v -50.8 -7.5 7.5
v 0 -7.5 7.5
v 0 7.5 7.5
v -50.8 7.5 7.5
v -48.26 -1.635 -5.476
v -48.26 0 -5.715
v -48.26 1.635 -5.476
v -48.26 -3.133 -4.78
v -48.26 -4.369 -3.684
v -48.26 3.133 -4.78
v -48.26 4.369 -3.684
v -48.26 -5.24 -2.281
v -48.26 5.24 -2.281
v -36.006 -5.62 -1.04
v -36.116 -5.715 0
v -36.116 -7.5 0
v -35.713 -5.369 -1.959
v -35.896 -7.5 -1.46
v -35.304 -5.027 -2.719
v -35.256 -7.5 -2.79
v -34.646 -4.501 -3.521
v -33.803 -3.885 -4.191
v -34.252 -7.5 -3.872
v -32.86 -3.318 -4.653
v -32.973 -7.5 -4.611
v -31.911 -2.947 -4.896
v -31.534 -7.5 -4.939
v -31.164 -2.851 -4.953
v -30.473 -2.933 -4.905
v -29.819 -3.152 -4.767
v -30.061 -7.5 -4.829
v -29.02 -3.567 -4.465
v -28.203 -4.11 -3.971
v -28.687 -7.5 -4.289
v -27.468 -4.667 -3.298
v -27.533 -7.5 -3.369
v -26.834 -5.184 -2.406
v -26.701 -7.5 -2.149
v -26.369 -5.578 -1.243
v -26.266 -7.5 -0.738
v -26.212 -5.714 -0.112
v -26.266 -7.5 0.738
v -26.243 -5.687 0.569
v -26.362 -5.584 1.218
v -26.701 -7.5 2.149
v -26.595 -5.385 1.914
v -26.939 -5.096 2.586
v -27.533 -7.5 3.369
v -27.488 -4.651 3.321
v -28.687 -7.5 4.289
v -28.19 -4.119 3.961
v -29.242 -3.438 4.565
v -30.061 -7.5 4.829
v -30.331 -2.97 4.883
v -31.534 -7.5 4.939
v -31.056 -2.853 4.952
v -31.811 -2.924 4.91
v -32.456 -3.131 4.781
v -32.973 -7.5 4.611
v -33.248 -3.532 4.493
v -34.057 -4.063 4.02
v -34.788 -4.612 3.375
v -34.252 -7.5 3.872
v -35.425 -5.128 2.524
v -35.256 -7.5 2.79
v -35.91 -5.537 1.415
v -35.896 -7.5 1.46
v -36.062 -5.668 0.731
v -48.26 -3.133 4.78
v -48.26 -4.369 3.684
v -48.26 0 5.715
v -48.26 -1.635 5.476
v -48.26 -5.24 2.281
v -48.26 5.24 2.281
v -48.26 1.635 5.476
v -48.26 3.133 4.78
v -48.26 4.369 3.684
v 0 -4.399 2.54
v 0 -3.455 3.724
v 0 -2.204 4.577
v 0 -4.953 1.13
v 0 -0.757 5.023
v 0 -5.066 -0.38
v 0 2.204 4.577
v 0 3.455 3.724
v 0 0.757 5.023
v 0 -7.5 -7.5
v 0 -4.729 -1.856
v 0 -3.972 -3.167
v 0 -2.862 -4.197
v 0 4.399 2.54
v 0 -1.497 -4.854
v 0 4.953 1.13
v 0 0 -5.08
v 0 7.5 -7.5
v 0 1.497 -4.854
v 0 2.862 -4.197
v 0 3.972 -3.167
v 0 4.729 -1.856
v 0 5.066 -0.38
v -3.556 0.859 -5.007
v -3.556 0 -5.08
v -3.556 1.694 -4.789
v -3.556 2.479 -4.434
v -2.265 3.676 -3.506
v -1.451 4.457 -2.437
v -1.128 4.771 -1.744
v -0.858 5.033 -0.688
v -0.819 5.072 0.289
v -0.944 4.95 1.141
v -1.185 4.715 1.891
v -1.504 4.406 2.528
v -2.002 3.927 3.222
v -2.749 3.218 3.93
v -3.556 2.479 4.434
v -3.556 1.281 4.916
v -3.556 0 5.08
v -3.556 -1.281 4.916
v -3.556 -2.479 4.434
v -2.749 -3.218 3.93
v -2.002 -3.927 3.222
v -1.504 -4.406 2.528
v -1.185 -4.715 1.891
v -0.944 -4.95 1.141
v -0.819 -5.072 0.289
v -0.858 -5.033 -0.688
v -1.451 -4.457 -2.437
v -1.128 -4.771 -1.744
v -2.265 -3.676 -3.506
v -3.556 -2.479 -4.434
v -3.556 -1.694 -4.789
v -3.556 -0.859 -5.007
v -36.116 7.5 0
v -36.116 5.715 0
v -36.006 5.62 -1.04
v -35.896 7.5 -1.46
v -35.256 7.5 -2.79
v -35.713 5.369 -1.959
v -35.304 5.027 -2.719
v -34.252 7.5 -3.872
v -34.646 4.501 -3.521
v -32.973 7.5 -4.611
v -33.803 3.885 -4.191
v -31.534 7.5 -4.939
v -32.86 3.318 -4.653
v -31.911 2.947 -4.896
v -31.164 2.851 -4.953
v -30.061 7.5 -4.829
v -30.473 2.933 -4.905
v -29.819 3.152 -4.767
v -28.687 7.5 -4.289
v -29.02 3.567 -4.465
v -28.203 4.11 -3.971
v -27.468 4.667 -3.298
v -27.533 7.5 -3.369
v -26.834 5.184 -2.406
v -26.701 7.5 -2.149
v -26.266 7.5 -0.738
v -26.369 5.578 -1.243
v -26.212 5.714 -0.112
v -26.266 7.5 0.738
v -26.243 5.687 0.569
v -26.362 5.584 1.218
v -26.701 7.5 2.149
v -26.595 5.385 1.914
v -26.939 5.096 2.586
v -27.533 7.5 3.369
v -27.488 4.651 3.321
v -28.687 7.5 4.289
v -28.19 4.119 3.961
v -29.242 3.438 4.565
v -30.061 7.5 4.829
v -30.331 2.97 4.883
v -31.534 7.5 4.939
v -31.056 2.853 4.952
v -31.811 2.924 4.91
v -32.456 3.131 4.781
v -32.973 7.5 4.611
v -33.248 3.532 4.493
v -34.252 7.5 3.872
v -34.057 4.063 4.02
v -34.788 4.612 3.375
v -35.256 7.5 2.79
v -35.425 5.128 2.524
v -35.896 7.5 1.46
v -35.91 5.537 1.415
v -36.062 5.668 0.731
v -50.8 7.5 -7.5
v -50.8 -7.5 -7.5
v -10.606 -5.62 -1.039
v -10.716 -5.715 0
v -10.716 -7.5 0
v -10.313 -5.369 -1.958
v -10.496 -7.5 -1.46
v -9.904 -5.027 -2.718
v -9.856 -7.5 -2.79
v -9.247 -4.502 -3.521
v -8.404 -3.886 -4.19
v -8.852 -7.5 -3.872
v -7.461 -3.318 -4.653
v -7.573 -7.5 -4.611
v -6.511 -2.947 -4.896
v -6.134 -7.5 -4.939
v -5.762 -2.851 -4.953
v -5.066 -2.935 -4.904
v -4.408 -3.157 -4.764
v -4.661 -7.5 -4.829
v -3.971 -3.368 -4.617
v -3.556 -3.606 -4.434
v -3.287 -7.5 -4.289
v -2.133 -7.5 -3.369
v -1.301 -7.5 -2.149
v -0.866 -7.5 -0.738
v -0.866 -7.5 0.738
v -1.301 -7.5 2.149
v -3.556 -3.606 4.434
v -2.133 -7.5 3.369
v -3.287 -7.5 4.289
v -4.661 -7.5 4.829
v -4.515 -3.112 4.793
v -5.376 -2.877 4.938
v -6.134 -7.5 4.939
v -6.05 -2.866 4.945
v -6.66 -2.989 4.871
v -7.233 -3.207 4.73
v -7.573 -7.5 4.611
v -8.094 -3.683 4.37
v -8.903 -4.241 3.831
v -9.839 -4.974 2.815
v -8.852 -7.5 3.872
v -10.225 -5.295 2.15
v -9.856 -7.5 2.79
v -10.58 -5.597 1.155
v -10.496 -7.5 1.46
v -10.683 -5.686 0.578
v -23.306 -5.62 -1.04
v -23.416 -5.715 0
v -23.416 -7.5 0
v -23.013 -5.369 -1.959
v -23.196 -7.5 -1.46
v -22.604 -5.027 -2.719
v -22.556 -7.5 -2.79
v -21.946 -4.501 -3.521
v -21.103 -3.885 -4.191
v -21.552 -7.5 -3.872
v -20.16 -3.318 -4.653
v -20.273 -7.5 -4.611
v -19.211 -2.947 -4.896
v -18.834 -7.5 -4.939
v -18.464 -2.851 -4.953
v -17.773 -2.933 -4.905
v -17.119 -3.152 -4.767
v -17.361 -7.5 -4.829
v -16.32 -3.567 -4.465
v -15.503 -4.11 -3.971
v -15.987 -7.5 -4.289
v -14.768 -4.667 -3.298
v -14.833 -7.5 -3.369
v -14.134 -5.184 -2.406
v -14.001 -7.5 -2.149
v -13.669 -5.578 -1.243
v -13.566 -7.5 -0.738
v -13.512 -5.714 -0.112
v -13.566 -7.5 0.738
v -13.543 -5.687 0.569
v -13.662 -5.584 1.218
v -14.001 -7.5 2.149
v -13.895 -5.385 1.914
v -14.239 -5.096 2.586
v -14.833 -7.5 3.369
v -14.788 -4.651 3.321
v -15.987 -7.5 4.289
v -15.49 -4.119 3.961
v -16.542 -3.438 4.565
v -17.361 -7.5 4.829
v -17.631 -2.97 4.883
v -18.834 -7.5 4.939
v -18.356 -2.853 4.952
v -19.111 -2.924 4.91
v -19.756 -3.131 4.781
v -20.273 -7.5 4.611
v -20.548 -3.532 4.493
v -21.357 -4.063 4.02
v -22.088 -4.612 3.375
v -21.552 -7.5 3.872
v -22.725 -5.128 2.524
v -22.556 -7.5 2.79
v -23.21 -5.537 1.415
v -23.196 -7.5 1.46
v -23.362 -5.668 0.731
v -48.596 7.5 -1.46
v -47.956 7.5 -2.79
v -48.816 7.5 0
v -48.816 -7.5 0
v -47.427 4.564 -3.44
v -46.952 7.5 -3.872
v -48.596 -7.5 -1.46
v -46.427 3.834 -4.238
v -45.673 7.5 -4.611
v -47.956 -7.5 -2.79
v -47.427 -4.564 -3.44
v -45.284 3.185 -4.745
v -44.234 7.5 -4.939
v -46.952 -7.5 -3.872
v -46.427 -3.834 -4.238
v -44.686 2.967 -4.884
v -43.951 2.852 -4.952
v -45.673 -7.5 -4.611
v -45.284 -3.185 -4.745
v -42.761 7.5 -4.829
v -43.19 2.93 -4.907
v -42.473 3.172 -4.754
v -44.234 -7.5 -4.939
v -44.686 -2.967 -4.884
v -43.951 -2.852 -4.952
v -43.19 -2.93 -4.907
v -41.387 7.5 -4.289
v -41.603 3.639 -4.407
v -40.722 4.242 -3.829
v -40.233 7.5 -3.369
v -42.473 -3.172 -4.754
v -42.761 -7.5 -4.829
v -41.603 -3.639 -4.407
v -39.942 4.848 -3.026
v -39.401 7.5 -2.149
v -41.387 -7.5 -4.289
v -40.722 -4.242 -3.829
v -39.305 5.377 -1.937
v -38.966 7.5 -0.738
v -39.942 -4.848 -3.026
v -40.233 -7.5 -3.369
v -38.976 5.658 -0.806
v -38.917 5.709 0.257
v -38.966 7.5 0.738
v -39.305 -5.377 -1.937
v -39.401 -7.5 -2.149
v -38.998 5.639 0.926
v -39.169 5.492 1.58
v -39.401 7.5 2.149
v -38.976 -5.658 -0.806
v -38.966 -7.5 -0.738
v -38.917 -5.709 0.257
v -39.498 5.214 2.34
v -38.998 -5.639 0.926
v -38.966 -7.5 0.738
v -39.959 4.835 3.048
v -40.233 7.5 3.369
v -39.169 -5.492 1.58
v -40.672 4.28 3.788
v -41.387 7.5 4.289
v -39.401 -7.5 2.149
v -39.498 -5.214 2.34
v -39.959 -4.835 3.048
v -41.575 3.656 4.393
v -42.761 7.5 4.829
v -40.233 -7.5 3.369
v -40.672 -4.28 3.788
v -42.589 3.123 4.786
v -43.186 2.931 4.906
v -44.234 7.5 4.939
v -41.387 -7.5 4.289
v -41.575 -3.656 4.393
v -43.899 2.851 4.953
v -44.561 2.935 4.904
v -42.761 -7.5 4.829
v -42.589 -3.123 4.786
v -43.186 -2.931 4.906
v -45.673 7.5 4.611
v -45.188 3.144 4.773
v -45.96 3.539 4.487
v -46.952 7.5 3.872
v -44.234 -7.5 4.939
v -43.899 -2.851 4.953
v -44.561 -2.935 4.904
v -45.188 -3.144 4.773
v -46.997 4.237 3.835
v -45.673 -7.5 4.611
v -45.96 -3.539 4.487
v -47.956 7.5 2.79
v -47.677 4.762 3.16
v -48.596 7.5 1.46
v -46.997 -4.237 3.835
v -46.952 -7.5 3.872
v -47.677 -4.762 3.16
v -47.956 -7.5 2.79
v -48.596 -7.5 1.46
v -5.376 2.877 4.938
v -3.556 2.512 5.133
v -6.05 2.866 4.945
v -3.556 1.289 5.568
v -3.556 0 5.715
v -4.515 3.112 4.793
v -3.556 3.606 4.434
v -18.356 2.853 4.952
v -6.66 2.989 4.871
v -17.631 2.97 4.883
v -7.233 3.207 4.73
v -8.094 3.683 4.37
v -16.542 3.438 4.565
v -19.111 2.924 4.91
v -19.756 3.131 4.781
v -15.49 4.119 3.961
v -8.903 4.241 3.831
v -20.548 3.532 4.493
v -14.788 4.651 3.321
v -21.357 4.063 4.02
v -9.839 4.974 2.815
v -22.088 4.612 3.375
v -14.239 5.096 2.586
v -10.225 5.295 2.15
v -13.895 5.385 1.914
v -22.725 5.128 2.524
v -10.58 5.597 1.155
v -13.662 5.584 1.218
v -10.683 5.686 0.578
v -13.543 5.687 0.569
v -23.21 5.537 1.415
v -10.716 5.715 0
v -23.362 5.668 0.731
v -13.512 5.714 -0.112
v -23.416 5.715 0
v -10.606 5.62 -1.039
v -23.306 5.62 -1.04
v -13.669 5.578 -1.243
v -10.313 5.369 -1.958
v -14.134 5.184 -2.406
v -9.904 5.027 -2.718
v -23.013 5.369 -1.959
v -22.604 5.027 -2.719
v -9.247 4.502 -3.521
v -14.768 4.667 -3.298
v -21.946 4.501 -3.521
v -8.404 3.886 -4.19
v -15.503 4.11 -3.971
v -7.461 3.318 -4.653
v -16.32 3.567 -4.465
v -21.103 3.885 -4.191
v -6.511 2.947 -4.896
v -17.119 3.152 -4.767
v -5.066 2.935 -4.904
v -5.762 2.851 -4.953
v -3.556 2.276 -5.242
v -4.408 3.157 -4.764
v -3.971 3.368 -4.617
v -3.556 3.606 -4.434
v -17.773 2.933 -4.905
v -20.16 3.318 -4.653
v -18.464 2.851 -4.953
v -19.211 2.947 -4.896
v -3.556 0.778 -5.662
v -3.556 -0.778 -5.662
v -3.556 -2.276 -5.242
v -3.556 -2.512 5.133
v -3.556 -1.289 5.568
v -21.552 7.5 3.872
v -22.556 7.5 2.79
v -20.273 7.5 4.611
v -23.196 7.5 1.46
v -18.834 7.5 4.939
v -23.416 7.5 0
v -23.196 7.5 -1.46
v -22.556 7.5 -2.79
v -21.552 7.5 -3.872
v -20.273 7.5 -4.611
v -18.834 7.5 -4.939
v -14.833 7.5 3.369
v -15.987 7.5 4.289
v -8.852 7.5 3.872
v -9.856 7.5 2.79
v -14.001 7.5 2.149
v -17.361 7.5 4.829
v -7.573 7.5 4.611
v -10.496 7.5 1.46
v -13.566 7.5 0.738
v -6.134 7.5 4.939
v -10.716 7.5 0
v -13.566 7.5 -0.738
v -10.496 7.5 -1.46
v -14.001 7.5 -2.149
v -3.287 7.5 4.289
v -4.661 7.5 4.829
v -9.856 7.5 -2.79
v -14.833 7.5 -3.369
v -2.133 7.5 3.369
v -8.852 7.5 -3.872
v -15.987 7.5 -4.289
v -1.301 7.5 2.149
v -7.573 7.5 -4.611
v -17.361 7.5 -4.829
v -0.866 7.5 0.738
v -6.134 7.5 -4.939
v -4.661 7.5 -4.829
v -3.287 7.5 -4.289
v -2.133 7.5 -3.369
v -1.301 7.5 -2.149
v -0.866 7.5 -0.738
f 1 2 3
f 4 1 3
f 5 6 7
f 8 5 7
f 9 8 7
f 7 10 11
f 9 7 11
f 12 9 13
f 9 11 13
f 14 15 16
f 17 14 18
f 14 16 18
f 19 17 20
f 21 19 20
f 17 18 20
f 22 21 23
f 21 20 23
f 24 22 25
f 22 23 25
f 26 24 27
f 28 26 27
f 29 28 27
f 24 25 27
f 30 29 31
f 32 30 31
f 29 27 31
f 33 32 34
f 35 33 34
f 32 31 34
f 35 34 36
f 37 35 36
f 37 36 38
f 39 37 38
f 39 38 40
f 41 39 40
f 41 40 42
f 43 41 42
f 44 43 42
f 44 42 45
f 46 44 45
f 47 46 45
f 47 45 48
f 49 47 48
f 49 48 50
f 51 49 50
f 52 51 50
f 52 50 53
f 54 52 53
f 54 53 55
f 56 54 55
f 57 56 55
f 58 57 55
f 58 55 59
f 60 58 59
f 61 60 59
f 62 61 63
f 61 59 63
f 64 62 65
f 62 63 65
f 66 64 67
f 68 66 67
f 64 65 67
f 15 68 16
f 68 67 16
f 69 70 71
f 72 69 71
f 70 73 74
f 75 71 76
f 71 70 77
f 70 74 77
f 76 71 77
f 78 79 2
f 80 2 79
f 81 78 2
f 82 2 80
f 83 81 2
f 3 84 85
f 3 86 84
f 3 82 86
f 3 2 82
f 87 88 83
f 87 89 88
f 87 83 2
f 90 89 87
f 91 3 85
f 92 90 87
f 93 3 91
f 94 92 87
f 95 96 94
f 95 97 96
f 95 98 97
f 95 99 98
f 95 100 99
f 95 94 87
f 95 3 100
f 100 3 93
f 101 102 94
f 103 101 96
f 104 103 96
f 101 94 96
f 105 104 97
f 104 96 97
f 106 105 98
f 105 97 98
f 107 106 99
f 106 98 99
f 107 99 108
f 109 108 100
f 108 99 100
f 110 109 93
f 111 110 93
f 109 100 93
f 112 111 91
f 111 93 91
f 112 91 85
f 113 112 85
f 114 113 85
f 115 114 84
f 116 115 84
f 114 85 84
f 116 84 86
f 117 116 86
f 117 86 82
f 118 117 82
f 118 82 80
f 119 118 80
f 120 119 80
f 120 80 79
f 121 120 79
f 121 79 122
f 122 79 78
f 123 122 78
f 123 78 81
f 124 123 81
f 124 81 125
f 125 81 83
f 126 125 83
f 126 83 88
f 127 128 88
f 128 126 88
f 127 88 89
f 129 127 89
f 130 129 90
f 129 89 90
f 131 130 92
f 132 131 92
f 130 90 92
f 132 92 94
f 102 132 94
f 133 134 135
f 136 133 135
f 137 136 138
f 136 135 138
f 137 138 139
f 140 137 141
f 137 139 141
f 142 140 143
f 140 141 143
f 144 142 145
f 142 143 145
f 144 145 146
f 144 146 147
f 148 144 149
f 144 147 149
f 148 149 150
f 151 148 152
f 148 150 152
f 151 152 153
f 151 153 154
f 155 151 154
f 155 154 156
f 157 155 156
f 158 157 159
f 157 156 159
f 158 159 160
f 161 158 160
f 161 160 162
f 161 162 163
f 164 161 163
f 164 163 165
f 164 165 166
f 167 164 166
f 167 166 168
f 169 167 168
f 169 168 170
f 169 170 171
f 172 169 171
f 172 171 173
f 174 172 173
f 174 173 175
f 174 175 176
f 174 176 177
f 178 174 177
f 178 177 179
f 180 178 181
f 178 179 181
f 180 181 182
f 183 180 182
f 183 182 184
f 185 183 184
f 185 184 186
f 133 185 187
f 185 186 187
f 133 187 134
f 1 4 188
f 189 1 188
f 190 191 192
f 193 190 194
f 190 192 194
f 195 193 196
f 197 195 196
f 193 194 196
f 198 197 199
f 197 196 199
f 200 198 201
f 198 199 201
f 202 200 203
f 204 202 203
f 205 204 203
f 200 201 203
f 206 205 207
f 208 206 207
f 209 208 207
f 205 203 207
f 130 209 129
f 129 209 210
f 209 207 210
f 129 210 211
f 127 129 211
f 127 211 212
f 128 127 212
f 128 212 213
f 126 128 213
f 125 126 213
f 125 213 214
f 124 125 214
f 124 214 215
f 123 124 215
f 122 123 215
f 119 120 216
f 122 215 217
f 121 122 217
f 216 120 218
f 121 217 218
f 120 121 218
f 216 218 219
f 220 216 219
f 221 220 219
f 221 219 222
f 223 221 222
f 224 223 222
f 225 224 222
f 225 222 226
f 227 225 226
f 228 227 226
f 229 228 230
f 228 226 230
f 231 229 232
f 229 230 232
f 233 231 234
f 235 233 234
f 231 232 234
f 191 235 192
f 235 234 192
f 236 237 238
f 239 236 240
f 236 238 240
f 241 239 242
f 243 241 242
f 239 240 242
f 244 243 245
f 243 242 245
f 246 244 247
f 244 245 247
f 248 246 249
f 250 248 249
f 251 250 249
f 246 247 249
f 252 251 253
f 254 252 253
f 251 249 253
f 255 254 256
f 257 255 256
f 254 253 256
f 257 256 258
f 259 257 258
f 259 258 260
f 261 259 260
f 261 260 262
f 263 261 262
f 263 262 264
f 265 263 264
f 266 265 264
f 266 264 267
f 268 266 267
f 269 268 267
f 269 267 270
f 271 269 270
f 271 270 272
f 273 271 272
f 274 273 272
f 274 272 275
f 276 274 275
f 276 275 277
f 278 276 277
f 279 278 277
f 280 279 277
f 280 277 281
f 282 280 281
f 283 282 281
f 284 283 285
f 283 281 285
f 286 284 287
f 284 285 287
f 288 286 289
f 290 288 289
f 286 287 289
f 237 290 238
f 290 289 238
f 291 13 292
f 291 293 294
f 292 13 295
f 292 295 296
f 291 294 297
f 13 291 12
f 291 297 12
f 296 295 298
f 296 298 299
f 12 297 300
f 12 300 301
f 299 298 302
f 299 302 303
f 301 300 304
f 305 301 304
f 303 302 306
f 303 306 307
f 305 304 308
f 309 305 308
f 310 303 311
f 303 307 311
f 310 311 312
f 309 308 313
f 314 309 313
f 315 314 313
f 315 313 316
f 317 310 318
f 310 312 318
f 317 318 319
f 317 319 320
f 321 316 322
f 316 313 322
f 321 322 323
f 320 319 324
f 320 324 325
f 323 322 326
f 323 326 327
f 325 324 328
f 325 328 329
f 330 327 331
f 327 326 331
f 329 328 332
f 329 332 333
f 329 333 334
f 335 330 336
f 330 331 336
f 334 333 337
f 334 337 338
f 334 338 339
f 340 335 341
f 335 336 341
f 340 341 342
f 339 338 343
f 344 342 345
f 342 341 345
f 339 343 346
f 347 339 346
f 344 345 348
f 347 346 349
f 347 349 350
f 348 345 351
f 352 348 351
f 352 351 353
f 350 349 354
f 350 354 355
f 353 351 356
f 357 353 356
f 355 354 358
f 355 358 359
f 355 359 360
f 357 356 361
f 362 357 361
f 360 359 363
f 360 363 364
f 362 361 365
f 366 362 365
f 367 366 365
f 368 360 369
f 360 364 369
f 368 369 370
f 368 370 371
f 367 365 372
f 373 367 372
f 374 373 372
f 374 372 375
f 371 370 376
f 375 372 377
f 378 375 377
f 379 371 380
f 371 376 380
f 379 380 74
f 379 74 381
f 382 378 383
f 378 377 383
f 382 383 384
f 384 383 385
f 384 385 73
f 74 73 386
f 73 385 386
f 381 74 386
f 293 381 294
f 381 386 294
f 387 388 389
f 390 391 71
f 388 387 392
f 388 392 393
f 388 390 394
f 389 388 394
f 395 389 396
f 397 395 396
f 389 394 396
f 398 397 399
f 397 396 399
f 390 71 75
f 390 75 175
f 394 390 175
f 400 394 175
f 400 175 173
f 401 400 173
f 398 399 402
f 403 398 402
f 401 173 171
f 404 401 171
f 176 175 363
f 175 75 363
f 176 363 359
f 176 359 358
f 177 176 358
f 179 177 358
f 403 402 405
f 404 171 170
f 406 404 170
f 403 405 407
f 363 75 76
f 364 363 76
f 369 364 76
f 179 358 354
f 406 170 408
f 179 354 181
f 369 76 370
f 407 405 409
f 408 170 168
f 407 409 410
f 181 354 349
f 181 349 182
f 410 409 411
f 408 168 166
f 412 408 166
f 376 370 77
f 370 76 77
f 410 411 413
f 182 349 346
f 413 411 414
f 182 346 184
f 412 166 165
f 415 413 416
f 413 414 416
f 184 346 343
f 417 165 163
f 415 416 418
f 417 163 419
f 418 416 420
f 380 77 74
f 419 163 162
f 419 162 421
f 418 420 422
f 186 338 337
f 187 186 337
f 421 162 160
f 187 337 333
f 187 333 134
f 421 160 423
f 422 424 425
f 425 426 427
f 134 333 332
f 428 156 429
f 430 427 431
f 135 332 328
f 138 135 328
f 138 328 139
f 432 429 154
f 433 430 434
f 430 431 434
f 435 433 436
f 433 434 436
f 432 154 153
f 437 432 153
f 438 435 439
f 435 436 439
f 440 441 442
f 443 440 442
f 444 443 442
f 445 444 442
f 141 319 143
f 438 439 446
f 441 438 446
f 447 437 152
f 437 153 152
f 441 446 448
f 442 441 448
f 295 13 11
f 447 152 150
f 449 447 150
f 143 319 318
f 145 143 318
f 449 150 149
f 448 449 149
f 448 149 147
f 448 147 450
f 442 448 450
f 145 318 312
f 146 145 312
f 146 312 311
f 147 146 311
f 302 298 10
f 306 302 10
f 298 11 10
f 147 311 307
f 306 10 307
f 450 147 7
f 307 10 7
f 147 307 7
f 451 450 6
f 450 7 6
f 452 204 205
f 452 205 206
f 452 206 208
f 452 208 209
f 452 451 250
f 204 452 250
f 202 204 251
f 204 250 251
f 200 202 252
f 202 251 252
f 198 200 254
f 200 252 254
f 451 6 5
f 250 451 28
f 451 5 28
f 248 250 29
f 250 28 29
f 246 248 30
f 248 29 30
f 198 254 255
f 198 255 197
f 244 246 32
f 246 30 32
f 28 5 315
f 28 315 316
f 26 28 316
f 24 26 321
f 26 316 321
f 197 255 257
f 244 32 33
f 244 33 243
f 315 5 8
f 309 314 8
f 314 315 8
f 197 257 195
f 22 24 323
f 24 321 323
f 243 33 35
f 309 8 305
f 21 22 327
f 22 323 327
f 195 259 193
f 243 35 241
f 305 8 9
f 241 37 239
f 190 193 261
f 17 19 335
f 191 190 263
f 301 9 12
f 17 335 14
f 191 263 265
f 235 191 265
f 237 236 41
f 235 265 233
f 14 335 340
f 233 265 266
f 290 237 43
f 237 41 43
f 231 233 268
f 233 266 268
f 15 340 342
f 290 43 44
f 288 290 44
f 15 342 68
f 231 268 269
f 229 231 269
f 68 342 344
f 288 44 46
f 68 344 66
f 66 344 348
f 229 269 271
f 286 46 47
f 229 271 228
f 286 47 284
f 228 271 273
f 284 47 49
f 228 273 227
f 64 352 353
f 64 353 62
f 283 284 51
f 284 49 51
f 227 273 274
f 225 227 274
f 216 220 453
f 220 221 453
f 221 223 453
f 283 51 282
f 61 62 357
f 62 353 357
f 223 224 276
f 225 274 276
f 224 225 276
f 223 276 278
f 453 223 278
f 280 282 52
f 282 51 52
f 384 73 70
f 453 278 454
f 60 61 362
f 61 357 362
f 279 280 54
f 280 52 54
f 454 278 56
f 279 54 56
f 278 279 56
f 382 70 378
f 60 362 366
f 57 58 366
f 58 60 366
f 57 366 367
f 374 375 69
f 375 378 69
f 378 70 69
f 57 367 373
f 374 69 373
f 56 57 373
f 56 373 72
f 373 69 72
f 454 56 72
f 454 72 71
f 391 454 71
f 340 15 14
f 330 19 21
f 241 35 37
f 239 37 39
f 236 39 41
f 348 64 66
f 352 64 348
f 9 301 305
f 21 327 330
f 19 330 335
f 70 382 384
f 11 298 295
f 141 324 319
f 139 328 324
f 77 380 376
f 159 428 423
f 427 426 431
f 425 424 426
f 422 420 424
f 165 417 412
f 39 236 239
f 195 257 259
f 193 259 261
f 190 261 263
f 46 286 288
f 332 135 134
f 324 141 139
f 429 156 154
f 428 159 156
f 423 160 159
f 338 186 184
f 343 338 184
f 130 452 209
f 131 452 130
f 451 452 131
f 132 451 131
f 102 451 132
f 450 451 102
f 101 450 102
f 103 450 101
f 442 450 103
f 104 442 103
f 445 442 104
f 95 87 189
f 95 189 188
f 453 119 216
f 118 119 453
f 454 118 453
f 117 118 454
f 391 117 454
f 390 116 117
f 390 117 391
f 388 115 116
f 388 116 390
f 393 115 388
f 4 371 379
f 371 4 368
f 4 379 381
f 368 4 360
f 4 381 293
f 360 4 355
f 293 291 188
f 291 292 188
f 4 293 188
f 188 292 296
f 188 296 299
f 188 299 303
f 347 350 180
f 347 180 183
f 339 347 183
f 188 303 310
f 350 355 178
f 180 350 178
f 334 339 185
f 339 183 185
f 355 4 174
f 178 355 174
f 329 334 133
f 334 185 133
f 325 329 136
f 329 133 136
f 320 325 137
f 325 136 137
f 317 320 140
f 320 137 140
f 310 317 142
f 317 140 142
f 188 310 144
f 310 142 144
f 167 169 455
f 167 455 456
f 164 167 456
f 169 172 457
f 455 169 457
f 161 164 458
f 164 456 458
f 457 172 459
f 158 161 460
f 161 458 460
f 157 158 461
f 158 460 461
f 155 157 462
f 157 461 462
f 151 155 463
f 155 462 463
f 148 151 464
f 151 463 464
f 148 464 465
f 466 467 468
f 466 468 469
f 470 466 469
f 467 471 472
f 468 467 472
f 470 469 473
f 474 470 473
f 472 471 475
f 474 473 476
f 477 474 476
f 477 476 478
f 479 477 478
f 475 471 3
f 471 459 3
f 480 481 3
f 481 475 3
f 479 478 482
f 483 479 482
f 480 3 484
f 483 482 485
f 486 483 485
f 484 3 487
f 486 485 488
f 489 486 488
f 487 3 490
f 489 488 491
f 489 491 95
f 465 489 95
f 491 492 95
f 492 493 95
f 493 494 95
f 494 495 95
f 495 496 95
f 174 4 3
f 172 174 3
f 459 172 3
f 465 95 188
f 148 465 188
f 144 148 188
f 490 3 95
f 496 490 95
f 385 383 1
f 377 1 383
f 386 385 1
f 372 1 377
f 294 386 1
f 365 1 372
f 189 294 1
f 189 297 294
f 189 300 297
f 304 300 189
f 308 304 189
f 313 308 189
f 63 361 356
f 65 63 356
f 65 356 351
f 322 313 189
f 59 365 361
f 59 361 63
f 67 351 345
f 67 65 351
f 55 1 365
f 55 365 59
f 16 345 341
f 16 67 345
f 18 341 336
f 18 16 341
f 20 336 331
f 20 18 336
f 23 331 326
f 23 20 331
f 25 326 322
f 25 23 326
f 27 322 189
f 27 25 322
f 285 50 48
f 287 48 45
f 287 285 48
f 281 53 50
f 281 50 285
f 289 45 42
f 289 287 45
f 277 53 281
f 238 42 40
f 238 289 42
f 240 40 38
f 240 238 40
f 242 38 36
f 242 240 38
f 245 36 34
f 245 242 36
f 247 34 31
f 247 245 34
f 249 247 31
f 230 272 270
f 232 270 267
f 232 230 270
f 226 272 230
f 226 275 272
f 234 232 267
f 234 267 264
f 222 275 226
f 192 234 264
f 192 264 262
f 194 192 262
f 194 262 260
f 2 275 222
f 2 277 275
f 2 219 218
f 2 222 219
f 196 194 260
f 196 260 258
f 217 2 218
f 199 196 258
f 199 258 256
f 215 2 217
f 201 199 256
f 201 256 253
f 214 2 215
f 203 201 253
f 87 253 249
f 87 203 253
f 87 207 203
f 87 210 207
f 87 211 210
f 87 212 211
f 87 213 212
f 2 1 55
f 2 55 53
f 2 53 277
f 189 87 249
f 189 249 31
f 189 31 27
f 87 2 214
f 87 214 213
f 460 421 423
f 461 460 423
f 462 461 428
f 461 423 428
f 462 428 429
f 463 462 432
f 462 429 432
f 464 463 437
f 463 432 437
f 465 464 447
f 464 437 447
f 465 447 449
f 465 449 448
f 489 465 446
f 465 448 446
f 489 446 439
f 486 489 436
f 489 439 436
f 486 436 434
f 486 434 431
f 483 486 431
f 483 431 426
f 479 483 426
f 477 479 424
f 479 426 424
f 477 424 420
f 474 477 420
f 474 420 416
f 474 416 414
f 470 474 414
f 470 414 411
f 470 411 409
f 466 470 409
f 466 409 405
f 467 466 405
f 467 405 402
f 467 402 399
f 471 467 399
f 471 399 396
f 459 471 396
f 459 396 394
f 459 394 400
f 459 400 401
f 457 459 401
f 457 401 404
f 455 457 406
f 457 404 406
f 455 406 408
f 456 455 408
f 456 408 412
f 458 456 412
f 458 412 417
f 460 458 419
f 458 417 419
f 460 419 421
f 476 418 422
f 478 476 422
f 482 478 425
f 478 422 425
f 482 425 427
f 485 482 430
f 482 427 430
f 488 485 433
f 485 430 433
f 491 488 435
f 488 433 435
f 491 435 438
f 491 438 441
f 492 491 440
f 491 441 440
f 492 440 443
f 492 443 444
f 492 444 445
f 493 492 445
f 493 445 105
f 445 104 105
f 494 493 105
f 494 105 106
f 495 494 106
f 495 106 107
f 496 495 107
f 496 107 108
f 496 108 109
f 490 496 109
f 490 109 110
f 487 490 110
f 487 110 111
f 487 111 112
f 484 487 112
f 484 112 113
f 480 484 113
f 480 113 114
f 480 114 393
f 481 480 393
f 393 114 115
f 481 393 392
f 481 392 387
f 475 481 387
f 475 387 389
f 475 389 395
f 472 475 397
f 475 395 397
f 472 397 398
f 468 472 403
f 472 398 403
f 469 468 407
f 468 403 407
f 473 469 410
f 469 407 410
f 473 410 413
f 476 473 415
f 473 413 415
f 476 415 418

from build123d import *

# Parameters (mm, degrees)
SKETCH1_W           = 15
SKETCH1_H           = 15
BOSS_EXTRUDE1_DEPTH = 50.8
SKETCH3_R           = 5.715
CUT_EXTRUDE1_DEPTH  = 44.704
SKETCH5_R           = 4.953
CUT_EXTRUDE3_DEPTH  = 16
LPATTERN1_COUNT     = 4
LPATTERN1_PITCH     = 12.7
SKETCH4_R           = 5.08
CUT_EXTRUDE5_DEPTH  = 6.096


with BuildPart() as part:
    # Sketch1 → Boss-Extrude1 (new body)
    with BuildSketch(Plane(origin=(0, 0, 0), x_dir=(0, 0, -1), z_dir=(1, 0, 0))):
        Rectangle(SKETCH1_W, SKETCH1_H)
    extrude(amount=-BOSS_EXTRUDE1_DEPTH)

    # Sketch3 → Cut-Extrude1 (cut)
    with BuildSketch(Plane.ZY.offset(48.26)):
        Circle(SKETCH3_R)
    extrude(amount=-CUT_EXTRUDE1_DEPTH, mode=Mode.SUBTRACT)

    # Sketch5 → Cut-Extrude3 (cut, through all)
    with BuildSketch(Plane(origin=(0, -7.5, 0), x_dir=(-1, 0, 0), z_dir=(0, -1, 0))):
        with Locations((43.863365925, 0)):
            Circle(SKETCH5_R)
    cut_extrude3 = extrude(amount=-CUT_EXTRUDE3_DEPTH, mode=Mode.SUBTRACT)

    # LPattern1: Cut-Extrude3 ×4
    with Locations(*[(i * LPATTERN1_PITCH, 0, 0) for i in range(1, LPATTERN1_COUNT)]):
        add(cut_extrude3, mode=Mode.SUBTRACT)

    # Sketch4 → Cut-Extrude5 (cut)
    with BuildSketch(Plane(origin=(0, 0, 0), x_dir=(0, 0, -1), z_dir=(1, 0, 0))):
        Circle(SKETCH4_R)
    extrude(amount=-CUT_EXTRUDE5_DEPTH, mode=Mode.SUBTRACT)


solid = part.part
